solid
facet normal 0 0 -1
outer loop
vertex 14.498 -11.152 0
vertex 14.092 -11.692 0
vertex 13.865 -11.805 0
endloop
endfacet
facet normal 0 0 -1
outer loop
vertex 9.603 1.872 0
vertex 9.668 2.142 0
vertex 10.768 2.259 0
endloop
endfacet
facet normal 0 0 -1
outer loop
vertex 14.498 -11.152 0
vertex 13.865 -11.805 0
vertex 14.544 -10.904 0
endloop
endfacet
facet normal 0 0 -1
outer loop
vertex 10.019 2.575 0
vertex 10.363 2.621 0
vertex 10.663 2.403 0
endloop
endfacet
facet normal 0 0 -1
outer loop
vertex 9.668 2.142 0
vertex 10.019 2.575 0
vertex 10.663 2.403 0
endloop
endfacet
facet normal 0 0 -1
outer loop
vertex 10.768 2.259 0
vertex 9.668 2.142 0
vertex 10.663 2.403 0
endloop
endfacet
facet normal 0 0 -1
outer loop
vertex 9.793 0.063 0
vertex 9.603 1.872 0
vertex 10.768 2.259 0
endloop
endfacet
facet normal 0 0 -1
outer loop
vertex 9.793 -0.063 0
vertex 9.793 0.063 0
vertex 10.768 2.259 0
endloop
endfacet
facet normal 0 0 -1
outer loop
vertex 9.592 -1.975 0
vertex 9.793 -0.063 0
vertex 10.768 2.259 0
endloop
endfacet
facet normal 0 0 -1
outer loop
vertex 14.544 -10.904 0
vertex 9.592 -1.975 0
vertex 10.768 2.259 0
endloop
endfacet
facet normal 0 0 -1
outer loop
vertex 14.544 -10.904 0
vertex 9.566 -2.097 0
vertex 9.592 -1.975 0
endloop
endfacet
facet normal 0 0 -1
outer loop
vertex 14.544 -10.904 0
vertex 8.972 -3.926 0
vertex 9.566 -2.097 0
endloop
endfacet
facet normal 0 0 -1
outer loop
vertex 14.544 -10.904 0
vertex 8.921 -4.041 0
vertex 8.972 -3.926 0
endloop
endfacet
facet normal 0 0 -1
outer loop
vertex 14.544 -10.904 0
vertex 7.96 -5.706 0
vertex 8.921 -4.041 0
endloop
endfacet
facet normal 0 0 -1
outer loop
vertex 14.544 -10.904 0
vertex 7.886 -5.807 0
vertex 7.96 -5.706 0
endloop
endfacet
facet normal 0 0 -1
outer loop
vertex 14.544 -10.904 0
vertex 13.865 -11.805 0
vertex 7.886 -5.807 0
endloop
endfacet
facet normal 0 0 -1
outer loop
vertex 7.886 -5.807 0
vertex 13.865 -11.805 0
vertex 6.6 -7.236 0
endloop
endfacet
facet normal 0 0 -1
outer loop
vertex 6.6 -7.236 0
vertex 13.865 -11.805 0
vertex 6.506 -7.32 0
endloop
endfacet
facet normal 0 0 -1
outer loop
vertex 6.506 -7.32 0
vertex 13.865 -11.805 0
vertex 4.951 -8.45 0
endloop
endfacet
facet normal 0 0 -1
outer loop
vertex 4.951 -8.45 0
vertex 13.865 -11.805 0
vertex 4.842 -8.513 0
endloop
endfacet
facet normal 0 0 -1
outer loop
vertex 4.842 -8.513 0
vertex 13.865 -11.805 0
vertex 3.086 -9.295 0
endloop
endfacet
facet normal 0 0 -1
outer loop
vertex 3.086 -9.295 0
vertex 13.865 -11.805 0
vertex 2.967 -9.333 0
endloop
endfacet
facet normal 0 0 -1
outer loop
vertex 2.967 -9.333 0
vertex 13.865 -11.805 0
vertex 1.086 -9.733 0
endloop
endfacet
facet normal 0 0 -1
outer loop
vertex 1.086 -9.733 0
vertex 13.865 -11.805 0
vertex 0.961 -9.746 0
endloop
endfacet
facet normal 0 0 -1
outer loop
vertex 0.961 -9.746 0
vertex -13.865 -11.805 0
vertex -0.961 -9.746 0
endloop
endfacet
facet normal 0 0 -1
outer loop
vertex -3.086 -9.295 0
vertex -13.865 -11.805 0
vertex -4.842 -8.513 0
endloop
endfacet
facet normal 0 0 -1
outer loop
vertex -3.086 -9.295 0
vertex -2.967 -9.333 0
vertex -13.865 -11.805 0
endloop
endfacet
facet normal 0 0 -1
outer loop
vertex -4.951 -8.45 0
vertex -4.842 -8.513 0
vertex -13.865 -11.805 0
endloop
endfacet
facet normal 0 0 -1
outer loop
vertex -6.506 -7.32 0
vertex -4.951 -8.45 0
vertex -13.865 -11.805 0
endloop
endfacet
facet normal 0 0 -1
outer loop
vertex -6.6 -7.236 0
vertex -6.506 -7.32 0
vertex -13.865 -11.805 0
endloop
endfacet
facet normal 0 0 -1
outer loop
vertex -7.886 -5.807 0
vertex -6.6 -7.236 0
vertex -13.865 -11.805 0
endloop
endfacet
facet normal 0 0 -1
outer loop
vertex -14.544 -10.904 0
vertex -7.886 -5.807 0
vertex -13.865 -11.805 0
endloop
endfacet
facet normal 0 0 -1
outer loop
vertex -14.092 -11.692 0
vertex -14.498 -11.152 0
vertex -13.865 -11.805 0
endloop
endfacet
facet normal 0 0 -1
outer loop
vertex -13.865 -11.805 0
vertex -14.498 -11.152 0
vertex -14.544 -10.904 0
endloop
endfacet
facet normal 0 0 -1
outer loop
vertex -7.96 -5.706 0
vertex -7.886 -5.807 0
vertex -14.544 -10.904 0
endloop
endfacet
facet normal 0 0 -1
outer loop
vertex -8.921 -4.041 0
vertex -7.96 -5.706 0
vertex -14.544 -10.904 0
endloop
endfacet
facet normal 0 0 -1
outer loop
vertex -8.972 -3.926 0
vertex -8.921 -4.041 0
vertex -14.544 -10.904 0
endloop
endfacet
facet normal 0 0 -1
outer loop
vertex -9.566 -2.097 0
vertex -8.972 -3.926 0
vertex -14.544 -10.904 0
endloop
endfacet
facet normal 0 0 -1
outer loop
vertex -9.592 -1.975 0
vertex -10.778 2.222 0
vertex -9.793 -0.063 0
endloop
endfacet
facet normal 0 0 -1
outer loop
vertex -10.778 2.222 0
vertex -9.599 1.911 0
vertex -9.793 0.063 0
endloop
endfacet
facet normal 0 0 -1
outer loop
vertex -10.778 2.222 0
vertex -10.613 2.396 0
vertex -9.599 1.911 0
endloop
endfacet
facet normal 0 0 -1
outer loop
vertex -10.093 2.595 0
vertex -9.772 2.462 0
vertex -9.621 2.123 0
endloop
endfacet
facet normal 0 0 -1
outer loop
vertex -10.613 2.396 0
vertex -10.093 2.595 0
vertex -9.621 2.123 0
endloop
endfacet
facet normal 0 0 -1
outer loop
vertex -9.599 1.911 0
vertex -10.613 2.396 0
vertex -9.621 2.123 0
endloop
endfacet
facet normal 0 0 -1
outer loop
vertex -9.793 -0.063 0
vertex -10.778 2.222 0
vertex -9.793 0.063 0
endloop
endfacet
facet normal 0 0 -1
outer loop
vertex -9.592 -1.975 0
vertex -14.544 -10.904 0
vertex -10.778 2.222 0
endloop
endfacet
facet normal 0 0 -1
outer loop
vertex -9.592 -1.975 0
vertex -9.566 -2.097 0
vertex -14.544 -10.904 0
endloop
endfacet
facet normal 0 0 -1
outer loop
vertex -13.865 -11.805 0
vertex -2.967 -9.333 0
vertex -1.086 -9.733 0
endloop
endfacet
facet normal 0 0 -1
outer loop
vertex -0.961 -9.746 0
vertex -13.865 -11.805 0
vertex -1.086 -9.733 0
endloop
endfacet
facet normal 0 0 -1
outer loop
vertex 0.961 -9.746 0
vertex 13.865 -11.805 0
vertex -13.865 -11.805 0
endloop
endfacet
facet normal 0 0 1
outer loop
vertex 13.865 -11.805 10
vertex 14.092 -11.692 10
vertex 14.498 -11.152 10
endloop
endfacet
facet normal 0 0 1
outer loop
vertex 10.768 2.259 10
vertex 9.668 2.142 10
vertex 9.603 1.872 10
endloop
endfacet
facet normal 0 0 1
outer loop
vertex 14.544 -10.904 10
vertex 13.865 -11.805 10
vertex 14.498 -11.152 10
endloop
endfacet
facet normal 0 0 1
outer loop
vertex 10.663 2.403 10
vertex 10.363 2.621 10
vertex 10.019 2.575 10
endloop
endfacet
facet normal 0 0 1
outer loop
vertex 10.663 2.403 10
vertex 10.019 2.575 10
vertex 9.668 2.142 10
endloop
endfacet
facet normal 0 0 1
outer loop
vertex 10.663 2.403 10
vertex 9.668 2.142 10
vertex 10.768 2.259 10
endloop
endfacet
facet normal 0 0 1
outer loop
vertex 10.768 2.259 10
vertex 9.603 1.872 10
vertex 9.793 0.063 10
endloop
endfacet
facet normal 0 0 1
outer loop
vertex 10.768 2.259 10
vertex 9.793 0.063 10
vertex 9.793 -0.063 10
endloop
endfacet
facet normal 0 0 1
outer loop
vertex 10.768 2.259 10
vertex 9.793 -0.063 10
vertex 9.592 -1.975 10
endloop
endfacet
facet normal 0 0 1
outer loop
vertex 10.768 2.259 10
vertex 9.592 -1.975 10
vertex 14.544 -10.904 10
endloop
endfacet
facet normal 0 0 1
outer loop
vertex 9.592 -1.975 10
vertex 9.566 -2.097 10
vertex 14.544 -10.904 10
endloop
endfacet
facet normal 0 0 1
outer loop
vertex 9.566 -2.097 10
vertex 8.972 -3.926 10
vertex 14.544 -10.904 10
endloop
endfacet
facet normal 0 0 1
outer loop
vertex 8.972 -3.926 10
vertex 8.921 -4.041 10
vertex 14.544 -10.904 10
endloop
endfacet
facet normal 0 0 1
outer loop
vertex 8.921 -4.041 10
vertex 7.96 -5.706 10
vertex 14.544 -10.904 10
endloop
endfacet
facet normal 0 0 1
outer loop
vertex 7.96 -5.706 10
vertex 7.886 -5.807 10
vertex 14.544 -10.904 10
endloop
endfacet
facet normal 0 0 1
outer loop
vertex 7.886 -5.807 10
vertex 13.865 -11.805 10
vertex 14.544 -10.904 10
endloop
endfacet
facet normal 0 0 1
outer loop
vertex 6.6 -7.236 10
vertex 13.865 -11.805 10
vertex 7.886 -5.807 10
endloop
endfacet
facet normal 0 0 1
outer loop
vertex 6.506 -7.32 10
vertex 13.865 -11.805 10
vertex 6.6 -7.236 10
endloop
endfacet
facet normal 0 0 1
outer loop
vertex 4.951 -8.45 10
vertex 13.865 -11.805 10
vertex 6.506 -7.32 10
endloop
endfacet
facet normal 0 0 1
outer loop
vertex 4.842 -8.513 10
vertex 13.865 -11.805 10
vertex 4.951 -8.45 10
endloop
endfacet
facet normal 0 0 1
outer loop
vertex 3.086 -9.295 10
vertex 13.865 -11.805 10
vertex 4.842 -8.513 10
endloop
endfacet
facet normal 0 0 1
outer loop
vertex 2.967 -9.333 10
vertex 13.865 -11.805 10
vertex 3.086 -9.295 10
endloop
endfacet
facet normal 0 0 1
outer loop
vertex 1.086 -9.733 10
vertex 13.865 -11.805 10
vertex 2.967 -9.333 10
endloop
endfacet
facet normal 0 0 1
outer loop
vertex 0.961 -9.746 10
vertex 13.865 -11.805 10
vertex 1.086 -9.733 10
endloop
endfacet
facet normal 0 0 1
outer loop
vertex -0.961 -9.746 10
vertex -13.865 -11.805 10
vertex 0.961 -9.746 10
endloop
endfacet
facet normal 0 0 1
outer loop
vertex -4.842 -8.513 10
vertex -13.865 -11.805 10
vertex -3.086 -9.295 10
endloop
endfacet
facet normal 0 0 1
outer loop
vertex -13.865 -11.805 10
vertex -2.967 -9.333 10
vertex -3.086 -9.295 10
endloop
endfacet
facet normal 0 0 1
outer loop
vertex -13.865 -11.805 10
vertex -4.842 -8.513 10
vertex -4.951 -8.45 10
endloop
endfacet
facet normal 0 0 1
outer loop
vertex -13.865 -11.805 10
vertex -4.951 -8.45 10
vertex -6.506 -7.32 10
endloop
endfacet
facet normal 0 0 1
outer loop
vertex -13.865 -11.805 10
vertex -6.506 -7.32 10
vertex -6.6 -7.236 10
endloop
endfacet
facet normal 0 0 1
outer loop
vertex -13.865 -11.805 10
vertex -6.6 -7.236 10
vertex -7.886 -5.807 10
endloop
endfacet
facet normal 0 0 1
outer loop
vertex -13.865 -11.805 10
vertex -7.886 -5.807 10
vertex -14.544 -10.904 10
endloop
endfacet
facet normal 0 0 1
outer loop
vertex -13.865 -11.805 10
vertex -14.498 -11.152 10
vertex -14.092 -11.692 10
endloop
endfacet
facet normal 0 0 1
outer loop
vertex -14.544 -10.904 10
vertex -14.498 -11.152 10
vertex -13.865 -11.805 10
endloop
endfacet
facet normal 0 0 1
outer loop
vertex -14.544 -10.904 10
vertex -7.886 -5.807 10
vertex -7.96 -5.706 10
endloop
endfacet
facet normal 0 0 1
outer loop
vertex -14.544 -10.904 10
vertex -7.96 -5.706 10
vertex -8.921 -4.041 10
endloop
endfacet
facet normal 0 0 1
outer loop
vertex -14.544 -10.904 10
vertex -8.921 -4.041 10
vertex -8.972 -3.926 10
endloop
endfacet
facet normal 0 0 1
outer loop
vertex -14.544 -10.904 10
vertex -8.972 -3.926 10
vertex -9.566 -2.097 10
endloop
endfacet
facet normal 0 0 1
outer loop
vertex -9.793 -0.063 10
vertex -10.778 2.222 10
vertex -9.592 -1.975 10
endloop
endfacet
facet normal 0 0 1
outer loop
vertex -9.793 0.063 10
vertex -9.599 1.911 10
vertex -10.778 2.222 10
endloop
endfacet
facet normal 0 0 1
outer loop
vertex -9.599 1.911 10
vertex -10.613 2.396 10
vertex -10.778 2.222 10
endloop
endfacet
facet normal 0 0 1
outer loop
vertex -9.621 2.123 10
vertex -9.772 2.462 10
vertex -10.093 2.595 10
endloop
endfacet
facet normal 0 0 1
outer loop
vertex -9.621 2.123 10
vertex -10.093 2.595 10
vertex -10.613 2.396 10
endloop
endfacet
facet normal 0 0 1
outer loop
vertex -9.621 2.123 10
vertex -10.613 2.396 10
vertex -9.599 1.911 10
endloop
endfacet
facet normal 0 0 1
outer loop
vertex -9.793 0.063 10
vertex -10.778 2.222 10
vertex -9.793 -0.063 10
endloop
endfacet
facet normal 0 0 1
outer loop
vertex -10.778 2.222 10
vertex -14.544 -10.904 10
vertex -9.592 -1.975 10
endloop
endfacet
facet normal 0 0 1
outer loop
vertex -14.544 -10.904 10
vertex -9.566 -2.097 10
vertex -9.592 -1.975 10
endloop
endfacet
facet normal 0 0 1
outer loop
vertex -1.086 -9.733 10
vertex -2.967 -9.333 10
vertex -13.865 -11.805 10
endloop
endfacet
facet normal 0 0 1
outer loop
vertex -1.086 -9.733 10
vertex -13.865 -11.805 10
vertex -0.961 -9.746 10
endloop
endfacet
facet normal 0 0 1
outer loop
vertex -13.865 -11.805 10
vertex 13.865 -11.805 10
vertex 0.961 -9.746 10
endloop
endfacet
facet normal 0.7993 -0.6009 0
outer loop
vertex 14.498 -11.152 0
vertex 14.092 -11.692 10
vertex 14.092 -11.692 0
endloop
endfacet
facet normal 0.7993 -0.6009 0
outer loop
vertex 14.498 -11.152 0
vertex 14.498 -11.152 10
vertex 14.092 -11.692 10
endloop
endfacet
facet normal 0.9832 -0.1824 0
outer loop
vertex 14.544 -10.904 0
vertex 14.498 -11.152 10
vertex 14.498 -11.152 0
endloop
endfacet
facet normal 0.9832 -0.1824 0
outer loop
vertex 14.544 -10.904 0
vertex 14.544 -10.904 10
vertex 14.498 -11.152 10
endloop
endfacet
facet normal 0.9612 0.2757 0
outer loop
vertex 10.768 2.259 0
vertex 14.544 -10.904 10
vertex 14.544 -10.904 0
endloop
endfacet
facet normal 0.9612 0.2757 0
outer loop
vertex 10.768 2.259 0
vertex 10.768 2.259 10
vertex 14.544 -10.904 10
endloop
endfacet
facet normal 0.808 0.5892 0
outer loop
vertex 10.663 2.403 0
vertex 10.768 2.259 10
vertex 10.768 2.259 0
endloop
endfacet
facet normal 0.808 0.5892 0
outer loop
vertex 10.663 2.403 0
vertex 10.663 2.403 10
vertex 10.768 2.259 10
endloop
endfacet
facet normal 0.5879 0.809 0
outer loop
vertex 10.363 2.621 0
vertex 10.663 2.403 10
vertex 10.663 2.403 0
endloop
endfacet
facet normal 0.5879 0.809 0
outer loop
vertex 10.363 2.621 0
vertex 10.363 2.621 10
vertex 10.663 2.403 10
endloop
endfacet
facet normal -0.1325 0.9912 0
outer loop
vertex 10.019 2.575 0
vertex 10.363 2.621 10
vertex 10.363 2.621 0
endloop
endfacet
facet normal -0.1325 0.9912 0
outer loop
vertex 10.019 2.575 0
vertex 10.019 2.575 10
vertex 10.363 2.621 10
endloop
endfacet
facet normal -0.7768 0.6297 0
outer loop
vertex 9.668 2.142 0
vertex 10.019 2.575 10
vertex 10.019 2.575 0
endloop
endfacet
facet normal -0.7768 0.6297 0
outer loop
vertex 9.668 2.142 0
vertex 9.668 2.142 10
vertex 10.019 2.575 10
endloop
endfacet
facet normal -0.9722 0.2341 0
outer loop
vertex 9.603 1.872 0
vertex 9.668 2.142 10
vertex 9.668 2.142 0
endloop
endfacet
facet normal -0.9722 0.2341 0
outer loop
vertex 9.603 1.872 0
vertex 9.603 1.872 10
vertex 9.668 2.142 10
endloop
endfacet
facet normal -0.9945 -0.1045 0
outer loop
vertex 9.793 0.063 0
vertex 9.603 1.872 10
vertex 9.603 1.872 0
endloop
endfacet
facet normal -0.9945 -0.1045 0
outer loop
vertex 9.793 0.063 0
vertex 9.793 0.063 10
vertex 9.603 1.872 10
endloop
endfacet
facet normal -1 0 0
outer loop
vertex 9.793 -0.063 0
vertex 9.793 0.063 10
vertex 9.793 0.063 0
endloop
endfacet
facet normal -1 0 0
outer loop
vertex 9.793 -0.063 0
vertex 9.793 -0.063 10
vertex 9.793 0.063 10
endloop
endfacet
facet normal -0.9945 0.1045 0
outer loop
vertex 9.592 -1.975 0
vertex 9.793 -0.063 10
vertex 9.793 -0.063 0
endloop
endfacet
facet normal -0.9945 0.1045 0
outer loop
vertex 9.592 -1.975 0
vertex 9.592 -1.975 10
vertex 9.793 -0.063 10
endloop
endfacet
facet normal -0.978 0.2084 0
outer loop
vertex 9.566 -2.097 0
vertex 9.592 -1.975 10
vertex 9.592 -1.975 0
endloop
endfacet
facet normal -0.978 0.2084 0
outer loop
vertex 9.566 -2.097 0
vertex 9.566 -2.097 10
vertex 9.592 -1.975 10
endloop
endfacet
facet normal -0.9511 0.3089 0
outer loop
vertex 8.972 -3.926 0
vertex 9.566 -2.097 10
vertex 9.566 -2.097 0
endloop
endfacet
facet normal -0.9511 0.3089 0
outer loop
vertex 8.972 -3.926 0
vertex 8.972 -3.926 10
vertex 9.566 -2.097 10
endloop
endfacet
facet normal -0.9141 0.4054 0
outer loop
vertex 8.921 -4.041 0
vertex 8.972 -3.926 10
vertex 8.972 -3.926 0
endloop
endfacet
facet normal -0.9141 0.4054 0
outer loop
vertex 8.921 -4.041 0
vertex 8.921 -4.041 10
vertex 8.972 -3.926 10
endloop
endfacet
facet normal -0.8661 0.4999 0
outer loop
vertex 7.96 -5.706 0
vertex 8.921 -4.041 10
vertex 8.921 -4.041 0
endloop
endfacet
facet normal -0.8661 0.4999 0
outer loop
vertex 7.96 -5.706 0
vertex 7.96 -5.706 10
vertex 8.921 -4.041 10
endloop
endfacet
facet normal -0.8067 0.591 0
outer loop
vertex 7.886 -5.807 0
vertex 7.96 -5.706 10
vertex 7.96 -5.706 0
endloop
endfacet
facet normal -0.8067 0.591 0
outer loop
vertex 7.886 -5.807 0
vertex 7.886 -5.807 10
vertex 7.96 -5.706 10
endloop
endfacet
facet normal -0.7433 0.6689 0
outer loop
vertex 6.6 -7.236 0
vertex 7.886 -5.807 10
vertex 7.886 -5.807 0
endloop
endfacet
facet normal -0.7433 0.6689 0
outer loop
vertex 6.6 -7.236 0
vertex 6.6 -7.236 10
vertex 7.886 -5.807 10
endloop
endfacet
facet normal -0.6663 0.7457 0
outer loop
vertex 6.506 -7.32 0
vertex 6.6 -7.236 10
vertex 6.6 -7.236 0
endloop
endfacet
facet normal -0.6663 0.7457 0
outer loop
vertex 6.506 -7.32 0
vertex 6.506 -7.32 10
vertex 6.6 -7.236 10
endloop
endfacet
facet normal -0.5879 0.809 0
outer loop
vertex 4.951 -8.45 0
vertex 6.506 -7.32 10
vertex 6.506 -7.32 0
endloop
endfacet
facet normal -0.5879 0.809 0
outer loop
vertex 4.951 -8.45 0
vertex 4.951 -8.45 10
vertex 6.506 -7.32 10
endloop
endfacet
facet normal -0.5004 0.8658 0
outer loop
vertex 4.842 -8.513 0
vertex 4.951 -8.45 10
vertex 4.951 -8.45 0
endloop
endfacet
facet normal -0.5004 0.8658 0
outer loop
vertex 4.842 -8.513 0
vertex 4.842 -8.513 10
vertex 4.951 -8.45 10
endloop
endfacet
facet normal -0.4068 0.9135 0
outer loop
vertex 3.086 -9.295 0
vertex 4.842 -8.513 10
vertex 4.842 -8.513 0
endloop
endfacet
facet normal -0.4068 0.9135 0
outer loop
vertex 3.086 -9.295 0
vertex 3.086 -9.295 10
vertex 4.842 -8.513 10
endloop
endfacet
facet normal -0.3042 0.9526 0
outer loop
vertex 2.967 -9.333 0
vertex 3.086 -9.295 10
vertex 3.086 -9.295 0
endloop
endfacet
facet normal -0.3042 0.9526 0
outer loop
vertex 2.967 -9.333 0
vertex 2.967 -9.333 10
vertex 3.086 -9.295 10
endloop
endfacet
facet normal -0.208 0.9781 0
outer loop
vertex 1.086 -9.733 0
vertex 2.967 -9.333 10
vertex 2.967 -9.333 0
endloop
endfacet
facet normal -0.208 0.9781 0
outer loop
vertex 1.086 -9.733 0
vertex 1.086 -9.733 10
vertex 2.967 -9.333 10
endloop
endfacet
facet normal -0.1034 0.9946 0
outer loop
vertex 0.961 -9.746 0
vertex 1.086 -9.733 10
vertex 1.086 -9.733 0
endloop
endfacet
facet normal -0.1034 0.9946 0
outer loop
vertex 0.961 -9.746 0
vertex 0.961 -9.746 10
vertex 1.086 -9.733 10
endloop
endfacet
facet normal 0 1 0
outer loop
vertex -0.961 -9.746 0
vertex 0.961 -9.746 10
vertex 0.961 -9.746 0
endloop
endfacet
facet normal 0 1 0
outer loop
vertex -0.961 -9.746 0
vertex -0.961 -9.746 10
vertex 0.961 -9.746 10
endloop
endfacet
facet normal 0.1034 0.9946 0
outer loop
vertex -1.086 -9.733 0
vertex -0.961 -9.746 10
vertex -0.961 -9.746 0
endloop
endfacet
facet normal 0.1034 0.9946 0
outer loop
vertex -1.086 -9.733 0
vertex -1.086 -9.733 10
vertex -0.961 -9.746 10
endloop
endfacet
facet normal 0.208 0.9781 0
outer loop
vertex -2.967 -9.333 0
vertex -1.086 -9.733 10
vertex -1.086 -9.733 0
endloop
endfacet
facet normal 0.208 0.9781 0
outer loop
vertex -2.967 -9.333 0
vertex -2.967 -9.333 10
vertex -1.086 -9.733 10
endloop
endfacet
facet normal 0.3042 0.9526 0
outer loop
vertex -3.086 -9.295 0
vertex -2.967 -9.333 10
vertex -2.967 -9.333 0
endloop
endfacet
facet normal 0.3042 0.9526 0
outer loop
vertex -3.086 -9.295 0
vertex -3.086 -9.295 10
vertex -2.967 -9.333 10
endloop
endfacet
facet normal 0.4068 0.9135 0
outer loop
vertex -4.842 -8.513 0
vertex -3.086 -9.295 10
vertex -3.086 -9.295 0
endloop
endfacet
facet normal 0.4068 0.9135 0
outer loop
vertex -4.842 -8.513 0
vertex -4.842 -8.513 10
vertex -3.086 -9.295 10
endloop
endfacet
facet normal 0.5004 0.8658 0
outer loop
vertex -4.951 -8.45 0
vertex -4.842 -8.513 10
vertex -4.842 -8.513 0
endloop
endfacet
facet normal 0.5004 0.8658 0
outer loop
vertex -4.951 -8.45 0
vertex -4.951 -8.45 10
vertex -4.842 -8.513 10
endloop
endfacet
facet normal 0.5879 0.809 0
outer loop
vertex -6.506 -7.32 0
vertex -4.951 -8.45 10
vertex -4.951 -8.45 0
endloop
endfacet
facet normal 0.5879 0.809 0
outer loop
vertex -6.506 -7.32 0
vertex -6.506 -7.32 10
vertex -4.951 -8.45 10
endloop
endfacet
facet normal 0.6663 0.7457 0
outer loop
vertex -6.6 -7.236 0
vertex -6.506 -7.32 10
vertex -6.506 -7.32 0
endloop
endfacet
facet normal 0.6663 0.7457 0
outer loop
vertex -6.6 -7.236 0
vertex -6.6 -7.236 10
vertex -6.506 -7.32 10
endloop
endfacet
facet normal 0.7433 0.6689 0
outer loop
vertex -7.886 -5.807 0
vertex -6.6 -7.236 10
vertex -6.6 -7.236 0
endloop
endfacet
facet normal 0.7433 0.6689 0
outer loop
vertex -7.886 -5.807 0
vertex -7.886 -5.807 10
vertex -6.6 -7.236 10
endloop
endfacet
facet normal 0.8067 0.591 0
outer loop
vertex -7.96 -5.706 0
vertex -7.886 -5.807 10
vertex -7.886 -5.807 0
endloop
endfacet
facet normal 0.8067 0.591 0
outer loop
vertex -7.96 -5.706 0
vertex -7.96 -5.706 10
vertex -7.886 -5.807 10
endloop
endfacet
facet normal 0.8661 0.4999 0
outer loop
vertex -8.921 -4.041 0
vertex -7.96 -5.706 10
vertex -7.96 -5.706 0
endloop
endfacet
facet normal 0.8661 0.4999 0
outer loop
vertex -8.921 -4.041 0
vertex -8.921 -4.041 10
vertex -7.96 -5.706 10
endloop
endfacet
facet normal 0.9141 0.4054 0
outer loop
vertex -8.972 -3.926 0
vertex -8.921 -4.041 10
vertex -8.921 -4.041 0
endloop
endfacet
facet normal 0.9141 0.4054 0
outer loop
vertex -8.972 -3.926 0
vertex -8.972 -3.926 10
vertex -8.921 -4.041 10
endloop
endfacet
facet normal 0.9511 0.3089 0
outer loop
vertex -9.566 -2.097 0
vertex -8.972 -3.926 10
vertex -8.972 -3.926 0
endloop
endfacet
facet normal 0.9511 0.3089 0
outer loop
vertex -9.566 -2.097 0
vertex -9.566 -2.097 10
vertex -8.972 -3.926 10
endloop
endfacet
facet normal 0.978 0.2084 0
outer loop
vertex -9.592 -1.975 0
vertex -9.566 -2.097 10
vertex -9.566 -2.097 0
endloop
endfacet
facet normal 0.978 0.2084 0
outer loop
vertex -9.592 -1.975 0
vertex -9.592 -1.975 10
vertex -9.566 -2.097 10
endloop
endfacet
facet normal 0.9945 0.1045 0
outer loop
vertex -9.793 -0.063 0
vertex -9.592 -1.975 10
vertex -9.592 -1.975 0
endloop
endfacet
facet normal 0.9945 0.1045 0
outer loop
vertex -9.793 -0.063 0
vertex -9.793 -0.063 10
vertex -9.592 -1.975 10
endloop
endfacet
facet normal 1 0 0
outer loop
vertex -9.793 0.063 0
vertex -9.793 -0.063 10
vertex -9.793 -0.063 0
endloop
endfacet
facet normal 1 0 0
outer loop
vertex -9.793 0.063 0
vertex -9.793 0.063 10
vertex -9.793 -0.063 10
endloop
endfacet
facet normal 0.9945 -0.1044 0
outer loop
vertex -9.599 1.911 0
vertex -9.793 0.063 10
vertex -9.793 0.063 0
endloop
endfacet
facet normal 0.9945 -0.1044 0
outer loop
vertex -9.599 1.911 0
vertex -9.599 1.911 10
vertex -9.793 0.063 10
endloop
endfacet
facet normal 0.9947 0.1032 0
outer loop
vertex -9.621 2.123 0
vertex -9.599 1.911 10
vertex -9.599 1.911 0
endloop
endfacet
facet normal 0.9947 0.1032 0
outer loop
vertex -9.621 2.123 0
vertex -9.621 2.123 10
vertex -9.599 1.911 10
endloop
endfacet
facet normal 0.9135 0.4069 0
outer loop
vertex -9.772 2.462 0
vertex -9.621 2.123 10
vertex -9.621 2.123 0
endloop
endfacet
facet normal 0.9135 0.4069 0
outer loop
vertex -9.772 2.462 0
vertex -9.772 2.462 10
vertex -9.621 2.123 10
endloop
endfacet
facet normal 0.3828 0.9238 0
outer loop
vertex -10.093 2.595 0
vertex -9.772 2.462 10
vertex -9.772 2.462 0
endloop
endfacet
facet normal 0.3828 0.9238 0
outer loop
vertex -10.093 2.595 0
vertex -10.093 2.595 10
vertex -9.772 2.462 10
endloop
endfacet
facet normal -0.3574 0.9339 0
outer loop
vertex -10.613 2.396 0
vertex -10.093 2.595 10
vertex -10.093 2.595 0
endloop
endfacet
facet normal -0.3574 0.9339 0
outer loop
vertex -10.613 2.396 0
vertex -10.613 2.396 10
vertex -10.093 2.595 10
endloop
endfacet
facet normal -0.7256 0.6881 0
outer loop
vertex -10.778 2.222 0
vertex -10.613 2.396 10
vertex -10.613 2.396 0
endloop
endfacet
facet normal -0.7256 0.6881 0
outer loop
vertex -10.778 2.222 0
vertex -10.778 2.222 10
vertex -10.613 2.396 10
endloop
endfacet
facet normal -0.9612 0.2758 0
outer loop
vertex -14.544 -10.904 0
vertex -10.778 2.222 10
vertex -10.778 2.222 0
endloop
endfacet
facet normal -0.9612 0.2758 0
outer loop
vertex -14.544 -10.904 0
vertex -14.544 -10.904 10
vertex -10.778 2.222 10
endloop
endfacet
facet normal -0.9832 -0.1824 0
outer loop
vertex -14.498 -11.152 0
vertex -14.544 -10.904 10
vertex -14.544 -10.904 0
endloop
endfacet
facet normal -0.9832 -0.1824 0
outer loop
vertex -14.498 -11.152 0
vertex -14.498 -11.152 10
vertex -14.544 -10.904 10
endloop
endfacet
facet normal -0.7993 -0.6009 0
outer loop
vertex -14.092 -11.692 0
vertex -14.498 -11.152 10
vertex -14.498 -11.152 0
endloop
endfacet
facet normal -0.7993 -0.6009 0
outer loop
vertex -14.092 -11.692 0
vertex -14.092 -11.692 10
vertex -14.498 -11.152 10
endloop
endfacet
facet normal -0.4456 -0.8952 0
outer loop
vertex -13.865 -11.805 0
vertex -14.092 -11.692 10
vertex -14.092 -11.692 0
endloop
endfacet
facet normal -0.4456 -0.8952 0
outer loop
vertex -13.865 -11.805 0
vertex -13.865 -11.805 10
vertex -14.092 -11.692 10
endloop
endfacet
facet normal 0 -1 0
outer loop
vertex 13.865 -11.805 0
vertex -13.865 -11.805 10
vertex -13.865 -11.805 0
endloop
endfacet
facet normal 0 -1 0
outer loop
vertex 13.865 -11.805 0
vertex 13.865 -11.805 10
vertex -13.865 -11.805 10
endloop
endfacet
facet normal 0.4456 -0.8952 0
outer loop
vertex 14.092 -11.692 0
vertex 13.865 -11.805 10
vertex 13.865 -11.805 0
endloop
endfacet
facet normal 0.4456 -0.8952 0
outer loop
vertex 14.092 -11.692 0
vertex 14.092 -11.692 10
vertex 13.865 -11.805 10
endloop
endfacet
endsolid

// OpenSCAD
// Ant tube

tube_inner_h = 80;
wall_thick = 0.8;
tube_inner_d = 18.0;

module antTube() {
    difference() {
        cylinder(d=tube_inner_d+2*wall_thick, h=tube_inner_h+wall_thick);
        translate([0,0,wall_thick])
        cylinder(d=tube_inner_d, h=tube_inner_h);
    }
}

uprighter_thick = 10;
uprighter_flare_dist = 5;
rounding = 0.6; // Also for clippy action, if desired
uprighter_wall_thick = 2.0;

module tubeUprighter() {
    linear_extrude(uprighter_thick)
    offset(-rounding) offset(rounding)
    offset(rounding) offset(-rounding)
    difference() {
        hull() {
            translate([0,-tube_inner_d/2-wall_thick-uprighter_wall_thick])
            square([tube_inner_d+2*wall_thick+uprighter_flare_dist*2, 0.01], center=true);
            circle(d=tube_inner_d+2*uprighter_wall_thick);
        }
        circle(d=tube_inner_d+2*wall_thick);
    }
}

tubeUprighter();
